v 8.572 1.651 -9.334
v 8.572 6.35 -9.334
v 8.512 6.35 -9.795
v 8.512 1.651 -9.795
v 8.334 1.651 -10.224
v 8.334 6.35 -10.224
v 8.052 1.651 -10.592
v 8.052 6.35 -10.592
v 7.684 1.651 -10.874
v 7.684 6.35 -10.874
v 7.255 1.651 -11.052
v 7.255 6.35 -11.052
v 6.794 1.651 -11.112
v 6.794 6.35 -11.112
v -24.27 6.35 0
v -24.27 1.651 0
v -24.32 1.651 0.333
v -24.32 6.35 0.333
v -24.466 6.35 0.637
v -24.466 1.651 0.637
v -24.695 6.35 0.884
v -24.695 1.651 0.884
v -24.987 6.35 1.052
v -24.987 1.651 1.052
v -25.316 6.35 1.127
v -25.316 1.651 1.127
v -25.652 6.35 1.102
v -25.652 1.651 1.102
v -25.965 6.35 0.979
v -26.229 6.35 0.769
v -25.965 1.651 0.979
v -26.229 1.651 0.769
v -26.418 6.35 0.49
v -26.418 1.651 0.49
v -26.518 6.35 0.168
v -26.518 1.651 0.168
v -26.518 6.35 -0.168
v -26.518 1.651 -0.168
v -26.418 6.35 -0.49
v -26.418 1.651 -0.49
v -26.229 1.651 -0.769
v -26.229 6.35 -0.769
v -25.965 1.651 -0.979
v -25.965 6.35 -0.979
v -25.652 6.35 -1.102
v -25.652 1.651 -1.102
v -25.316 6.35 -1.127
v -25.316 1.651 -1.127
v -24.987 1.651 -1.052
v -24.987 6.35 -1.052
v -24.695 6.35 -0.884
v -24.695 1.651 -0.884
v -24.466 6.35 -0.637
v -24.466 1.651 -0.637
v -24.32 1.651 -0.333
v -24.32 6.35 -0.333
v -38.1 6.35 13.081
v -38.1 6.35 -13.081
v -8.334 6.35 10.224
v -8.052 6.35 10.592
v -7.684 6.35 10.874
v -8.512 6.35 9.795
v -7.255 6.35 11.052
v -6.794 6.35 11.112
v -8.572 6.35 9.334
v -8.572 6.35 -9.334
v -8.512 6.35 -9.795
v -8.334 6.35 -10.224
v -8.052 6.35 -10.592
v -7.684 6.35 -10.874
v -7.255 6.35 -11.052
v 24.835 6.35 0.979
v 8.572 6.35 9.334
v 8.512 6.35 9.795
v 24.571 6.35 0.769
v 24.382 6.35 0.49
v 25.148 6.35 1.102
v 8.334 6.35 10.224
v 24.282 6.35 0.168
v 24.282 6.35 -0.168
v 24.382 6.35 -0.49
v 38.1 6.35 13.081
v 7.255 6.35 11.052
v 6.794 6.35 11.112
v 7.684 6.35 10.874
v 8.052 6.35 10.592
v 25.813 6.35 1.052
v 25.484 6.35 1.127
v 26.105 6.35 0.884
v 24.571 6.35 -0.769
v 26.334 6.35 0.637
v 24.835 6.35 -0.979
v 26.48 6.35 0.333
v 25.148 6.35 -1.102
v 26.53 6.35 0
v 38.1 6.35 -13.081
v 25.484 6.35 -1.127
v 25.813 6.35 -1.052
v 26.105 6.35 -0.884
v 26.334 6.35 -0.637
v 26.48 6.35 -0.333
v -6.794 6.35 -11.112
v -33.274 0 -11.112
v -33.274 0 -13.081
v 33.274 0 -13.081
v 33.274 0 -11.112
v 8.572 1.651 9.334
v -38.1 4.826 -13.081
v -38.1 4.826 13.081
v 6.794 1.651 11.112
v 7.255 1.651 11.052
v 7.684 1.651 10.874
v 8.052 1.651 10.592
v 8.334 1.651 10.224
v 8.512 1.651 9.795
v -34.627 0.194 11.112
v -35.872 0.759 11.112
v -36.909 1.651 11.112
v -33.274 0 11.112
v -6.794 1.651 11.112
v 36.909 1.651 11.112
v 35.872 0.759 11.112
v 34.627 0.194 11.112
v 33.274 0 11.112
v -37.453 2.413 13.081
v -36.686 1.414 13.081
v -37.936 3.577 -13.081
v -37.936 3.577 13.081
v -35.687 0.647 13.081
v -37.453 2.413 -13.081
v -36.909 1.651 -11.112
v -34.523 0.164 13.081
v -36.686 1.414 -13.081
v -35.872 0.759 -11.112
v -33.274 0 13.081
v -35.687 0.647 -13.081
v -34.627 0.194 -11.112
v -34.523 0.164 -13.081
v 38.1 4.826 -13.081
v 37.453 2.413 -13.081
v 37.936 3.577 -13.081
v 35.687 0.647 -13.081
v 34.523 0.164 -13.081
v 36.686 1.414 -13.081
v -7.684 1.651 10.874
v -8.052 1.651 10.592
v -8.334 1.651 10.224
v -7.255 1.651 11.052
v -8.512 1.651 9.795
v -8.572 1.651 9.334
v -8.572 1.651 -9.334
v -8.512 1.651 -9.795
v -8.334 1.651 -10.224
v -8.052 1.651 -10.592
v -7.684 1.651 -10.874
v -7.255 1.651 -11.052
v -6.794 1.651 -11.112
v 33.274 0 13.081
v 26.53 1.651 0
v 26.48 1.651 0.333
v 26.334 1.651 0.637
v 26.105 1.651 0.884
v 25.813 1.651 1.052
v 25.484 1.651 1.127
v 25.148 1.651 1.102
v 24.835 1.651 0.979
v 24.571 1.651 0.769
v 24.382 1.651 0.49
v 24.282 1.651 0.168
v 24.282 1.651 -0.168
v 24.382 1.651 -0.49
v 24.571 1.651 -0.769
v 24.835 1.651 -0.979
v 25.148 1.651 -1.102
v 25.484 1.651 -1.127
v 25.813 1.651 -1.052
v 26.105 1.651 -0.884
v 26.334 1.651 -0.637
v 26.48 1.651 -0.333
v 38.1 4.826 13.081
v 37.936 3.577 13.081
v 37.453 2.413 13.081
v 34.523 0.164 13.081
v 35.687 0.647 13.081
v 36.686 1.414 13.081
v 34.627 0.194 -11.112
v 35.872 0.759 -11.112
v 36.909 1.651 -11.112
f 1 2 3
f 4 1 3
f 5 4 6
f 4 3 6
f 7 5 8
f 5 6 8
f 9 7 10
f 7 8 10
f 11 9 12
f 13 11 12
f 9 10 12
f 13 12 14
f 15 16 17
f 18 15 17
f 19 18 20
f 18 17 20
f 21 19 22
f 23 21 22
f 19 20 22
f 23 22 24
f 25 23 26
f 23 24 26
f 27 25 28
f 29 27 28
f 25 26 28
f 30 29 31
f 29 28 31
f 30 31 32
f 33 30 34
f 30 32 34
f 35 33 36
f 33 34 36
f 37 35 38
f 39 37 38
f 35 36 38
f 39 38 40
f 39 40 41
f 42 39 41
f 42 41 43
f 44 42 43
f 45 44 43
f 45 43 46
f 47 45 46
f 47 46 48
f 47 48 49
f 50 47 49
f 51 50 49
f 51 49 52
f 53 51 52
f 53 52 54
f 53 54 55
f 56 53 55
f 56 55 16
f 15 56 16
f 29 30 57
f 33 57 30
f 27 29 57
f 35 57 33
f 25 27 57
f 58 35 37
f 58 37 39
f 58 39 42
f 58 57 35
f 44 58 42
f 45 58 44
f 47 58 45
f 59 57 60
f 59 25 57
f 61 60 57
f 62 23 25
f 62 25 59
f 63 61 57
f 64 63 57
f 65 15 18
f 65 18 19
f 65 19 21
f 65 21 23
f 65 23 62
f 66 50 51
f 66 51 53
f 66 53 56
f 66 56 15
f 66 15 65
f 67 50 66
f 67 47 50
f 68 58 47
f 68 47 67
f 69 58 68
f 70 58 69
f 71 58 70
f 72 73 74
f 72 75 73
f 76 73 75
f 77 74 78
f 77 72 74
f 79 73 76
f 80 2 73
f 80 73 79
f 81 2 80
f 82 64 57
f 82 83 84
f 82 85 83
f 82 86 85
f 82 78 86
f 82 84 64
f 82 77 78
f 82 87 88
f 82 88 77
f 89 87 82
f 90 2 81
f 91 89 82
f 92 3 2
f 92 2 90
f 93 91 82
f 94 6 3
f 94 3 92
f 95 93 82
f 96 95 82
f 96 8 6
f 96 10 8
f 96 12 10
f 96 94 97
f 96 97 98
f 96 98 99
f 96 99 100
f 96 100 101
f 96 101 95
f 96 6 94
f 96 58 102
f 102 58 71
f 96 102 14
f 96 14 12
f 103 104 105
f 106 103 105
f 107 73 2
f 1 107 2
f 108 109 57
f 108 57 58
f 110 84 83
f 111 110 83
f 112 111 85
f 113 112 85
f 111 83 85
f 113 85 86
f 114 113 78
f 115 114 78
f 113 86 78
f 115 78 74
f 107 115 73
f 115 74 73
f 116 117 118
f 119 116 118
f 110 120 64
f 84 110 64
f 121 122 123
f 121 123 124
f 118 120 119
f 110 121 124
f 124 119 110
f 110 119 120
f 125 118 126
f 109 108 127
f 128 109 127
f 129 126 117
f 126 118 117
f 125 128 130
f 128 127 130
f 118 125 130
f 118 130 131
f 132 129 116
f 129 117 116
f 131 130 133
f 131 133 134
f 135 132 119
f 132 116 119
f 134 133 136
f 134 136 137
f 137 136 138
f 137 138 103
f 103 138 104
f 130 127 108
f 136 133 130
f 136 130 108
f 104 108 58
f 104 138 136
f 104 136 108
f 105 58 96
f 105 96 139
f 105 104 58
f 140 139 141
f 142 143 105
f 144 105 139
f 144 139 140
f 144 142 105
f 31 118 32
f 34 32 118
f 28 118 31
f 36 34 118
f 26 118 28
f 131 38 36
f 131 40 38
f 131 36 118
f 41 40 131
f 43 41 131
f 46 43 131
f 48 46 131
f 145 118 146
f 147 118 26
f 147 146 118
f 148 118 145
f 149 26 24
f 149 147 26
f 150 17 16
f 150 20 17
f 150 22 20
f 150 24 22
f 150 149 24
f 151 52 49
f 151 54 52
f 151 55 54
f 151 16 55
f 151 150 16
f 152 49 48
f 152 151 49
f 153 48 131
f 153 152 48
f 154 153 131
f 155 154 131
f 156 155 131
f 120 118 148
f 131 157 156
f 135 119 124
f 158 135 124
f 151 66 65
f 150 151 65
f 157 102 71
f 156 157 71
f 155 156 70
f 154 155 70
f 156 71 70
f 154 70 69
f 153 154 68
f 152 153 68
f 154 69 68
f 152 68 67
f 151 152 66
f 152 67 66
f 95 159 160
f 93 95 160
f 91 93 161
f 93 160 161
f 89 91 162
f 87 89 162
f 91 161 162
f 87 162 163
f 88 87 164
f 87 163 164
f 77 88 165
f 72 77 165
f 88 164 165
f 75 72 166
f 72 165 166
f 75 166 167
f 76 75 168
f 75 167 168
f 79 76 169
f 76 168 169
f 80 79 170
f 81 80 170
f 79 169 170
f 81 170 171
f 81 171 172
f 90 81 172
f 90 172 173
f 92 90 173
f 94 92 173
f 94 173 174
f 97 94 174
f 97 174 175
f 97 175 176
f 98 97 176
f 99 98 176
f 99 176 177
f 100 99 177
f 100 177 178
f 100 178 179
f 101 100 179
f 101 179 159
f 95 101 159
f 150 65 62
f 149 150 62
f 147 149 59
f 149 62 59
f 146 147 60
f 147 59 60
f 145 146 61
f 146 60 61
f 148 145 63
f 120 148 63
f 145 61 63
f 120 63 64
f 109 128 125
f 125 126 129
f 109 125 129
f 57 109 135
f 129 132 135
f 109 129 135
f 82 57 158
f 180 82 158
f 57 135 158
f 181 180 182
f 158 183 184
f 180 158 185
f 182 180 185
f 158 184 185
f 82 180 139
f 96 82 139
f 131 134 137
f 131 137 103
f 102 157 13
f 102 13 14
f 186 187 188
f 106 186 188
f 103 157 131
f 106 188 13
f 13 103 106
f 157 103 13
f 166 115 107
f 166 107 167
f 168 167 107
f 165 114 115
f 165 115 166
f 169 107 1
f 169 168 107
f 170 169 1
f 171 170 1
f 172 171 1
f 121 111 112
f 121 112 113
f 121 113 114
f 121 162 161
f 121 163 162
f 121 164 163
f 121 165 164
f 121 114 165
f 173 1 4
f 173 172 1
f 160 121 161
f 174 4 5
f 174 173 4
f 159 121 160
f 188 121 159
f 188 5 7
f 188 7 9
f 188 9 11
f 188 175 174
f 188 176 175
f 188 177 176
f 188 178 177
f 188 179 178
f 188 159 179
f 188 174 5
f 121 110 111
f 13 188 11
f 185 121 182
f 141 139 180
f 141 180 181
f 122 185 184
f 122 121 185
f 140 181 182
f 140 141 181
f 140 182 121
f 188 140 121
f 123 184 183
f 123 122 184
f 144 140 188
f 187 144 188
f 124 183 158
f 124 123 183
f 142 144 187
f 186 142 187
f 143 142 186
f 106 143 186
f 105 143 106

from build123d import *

# Parameters (mm, degrees)
SKETCH1_W               = 76.2
SKETCH1_H               = 26.162
BOSS_EXTRUDE1_DEPTH     = 6.35
FILLET1_R               = 4.826
SKETCH2_W               = 22.225
SKETCH2_H               = 1.651
CUT_EXTRUDE1_DEPTH      = 78.574964138
CUT_EXTRUDE2_DEPTH      = 41.556172921
CUT_EXTRUDE2_DEPTH_BACK = 41.556172921
F_4_40_TAPPED_HOLE1_D   = 2.2606


with BuildPart() as part:
    # Sketch1 → Boss-Extrude1 (new body)
    with BuildSketch(Plane(origin=(0, 0, 0), x_dir=(1, 0, 0), z_dir=(0, 1, 0))):
        Rectangle(SKETCH1_W, SKETCH1_H)
    extrude(amount=BOSS_EXTRUDE1_DEPTH)

    # Fillet1
    fillet1_edges = [part.edges().sort_by_distance(p)[0] for p in [
        (-38.1, 0, 0),
        (38.1, 0, 0),
    ]]
    fillet(fillet1_edges, radius=FILLET1_R)

    # Sketch2 → Cut-Extrude1 (cut, through all)
    with BuildSketch(Plane(origin=(38.1, 0, 0), x_dir=(0, 0, -1), z_dir=(1, 0, 0))):
        with Locations((0, 0.8255)):
            Rectangle(SKETCH2_W, SKETCH2_H)
    extrude(amount=-CUT_EXTRUDE1_DEPTH, mode=Mode.SUBTRACT)

    # Sketch3 → Cut-Extrude2 (cut, two sides: drawn at the far end of the back side and taken through both)
    with BuildSketch(Plane.XZ.offset(-1.651).offset(-CUT_EXTRUDE2_DEPTH_BACK)):
        with BuildLine():
            Line((6.7945, -11.1125), (-6.7945, -11.1125))
            ThreePointArc((-6.7945, -11.1125), (-8.051735857, -10.591735857), (-8.5725, -9.3345))
            Line((-8.5725, -9.3345), (-8.5725, 9.3345))
            ThreePointArc((-8.5725, 9.3345), (-8.051735857, 10.591735857), (-6.7945, 11.1125))
            Line((-6.7945, 11.1125), (6.7945, 11.1125))
            ThreePointArc((6.7945, 11.1125), (8.051735857, 10.591735857), (8.5725, 9.3345))
            Line((8.5725, 9.3345), (8.5725, -9.3345))
            ThreePointArc((8.5725, -9.3345), (8.051735857, -10.591735857), (6.7945, -11.1125))
        make_face()
    extrude(amount=CUT_EXTRUDE2_DEPTH + CUT_EXTRUDE2_DEPTH_BACK, mode=Mode.SUBTRACT)

    # #4-40 Tapped Hole1 (through all)
    with Locations(Plane(origin=(0, 6.35, 0), x_dir=(-1, 0, 0), z_dir=(0, 1, 0))):
        with Locations((25.4, 0), (-25.4, 0)):
            Hole(F_4_40_TAPPED_HOLE1_D / 2)


solid = part.part
